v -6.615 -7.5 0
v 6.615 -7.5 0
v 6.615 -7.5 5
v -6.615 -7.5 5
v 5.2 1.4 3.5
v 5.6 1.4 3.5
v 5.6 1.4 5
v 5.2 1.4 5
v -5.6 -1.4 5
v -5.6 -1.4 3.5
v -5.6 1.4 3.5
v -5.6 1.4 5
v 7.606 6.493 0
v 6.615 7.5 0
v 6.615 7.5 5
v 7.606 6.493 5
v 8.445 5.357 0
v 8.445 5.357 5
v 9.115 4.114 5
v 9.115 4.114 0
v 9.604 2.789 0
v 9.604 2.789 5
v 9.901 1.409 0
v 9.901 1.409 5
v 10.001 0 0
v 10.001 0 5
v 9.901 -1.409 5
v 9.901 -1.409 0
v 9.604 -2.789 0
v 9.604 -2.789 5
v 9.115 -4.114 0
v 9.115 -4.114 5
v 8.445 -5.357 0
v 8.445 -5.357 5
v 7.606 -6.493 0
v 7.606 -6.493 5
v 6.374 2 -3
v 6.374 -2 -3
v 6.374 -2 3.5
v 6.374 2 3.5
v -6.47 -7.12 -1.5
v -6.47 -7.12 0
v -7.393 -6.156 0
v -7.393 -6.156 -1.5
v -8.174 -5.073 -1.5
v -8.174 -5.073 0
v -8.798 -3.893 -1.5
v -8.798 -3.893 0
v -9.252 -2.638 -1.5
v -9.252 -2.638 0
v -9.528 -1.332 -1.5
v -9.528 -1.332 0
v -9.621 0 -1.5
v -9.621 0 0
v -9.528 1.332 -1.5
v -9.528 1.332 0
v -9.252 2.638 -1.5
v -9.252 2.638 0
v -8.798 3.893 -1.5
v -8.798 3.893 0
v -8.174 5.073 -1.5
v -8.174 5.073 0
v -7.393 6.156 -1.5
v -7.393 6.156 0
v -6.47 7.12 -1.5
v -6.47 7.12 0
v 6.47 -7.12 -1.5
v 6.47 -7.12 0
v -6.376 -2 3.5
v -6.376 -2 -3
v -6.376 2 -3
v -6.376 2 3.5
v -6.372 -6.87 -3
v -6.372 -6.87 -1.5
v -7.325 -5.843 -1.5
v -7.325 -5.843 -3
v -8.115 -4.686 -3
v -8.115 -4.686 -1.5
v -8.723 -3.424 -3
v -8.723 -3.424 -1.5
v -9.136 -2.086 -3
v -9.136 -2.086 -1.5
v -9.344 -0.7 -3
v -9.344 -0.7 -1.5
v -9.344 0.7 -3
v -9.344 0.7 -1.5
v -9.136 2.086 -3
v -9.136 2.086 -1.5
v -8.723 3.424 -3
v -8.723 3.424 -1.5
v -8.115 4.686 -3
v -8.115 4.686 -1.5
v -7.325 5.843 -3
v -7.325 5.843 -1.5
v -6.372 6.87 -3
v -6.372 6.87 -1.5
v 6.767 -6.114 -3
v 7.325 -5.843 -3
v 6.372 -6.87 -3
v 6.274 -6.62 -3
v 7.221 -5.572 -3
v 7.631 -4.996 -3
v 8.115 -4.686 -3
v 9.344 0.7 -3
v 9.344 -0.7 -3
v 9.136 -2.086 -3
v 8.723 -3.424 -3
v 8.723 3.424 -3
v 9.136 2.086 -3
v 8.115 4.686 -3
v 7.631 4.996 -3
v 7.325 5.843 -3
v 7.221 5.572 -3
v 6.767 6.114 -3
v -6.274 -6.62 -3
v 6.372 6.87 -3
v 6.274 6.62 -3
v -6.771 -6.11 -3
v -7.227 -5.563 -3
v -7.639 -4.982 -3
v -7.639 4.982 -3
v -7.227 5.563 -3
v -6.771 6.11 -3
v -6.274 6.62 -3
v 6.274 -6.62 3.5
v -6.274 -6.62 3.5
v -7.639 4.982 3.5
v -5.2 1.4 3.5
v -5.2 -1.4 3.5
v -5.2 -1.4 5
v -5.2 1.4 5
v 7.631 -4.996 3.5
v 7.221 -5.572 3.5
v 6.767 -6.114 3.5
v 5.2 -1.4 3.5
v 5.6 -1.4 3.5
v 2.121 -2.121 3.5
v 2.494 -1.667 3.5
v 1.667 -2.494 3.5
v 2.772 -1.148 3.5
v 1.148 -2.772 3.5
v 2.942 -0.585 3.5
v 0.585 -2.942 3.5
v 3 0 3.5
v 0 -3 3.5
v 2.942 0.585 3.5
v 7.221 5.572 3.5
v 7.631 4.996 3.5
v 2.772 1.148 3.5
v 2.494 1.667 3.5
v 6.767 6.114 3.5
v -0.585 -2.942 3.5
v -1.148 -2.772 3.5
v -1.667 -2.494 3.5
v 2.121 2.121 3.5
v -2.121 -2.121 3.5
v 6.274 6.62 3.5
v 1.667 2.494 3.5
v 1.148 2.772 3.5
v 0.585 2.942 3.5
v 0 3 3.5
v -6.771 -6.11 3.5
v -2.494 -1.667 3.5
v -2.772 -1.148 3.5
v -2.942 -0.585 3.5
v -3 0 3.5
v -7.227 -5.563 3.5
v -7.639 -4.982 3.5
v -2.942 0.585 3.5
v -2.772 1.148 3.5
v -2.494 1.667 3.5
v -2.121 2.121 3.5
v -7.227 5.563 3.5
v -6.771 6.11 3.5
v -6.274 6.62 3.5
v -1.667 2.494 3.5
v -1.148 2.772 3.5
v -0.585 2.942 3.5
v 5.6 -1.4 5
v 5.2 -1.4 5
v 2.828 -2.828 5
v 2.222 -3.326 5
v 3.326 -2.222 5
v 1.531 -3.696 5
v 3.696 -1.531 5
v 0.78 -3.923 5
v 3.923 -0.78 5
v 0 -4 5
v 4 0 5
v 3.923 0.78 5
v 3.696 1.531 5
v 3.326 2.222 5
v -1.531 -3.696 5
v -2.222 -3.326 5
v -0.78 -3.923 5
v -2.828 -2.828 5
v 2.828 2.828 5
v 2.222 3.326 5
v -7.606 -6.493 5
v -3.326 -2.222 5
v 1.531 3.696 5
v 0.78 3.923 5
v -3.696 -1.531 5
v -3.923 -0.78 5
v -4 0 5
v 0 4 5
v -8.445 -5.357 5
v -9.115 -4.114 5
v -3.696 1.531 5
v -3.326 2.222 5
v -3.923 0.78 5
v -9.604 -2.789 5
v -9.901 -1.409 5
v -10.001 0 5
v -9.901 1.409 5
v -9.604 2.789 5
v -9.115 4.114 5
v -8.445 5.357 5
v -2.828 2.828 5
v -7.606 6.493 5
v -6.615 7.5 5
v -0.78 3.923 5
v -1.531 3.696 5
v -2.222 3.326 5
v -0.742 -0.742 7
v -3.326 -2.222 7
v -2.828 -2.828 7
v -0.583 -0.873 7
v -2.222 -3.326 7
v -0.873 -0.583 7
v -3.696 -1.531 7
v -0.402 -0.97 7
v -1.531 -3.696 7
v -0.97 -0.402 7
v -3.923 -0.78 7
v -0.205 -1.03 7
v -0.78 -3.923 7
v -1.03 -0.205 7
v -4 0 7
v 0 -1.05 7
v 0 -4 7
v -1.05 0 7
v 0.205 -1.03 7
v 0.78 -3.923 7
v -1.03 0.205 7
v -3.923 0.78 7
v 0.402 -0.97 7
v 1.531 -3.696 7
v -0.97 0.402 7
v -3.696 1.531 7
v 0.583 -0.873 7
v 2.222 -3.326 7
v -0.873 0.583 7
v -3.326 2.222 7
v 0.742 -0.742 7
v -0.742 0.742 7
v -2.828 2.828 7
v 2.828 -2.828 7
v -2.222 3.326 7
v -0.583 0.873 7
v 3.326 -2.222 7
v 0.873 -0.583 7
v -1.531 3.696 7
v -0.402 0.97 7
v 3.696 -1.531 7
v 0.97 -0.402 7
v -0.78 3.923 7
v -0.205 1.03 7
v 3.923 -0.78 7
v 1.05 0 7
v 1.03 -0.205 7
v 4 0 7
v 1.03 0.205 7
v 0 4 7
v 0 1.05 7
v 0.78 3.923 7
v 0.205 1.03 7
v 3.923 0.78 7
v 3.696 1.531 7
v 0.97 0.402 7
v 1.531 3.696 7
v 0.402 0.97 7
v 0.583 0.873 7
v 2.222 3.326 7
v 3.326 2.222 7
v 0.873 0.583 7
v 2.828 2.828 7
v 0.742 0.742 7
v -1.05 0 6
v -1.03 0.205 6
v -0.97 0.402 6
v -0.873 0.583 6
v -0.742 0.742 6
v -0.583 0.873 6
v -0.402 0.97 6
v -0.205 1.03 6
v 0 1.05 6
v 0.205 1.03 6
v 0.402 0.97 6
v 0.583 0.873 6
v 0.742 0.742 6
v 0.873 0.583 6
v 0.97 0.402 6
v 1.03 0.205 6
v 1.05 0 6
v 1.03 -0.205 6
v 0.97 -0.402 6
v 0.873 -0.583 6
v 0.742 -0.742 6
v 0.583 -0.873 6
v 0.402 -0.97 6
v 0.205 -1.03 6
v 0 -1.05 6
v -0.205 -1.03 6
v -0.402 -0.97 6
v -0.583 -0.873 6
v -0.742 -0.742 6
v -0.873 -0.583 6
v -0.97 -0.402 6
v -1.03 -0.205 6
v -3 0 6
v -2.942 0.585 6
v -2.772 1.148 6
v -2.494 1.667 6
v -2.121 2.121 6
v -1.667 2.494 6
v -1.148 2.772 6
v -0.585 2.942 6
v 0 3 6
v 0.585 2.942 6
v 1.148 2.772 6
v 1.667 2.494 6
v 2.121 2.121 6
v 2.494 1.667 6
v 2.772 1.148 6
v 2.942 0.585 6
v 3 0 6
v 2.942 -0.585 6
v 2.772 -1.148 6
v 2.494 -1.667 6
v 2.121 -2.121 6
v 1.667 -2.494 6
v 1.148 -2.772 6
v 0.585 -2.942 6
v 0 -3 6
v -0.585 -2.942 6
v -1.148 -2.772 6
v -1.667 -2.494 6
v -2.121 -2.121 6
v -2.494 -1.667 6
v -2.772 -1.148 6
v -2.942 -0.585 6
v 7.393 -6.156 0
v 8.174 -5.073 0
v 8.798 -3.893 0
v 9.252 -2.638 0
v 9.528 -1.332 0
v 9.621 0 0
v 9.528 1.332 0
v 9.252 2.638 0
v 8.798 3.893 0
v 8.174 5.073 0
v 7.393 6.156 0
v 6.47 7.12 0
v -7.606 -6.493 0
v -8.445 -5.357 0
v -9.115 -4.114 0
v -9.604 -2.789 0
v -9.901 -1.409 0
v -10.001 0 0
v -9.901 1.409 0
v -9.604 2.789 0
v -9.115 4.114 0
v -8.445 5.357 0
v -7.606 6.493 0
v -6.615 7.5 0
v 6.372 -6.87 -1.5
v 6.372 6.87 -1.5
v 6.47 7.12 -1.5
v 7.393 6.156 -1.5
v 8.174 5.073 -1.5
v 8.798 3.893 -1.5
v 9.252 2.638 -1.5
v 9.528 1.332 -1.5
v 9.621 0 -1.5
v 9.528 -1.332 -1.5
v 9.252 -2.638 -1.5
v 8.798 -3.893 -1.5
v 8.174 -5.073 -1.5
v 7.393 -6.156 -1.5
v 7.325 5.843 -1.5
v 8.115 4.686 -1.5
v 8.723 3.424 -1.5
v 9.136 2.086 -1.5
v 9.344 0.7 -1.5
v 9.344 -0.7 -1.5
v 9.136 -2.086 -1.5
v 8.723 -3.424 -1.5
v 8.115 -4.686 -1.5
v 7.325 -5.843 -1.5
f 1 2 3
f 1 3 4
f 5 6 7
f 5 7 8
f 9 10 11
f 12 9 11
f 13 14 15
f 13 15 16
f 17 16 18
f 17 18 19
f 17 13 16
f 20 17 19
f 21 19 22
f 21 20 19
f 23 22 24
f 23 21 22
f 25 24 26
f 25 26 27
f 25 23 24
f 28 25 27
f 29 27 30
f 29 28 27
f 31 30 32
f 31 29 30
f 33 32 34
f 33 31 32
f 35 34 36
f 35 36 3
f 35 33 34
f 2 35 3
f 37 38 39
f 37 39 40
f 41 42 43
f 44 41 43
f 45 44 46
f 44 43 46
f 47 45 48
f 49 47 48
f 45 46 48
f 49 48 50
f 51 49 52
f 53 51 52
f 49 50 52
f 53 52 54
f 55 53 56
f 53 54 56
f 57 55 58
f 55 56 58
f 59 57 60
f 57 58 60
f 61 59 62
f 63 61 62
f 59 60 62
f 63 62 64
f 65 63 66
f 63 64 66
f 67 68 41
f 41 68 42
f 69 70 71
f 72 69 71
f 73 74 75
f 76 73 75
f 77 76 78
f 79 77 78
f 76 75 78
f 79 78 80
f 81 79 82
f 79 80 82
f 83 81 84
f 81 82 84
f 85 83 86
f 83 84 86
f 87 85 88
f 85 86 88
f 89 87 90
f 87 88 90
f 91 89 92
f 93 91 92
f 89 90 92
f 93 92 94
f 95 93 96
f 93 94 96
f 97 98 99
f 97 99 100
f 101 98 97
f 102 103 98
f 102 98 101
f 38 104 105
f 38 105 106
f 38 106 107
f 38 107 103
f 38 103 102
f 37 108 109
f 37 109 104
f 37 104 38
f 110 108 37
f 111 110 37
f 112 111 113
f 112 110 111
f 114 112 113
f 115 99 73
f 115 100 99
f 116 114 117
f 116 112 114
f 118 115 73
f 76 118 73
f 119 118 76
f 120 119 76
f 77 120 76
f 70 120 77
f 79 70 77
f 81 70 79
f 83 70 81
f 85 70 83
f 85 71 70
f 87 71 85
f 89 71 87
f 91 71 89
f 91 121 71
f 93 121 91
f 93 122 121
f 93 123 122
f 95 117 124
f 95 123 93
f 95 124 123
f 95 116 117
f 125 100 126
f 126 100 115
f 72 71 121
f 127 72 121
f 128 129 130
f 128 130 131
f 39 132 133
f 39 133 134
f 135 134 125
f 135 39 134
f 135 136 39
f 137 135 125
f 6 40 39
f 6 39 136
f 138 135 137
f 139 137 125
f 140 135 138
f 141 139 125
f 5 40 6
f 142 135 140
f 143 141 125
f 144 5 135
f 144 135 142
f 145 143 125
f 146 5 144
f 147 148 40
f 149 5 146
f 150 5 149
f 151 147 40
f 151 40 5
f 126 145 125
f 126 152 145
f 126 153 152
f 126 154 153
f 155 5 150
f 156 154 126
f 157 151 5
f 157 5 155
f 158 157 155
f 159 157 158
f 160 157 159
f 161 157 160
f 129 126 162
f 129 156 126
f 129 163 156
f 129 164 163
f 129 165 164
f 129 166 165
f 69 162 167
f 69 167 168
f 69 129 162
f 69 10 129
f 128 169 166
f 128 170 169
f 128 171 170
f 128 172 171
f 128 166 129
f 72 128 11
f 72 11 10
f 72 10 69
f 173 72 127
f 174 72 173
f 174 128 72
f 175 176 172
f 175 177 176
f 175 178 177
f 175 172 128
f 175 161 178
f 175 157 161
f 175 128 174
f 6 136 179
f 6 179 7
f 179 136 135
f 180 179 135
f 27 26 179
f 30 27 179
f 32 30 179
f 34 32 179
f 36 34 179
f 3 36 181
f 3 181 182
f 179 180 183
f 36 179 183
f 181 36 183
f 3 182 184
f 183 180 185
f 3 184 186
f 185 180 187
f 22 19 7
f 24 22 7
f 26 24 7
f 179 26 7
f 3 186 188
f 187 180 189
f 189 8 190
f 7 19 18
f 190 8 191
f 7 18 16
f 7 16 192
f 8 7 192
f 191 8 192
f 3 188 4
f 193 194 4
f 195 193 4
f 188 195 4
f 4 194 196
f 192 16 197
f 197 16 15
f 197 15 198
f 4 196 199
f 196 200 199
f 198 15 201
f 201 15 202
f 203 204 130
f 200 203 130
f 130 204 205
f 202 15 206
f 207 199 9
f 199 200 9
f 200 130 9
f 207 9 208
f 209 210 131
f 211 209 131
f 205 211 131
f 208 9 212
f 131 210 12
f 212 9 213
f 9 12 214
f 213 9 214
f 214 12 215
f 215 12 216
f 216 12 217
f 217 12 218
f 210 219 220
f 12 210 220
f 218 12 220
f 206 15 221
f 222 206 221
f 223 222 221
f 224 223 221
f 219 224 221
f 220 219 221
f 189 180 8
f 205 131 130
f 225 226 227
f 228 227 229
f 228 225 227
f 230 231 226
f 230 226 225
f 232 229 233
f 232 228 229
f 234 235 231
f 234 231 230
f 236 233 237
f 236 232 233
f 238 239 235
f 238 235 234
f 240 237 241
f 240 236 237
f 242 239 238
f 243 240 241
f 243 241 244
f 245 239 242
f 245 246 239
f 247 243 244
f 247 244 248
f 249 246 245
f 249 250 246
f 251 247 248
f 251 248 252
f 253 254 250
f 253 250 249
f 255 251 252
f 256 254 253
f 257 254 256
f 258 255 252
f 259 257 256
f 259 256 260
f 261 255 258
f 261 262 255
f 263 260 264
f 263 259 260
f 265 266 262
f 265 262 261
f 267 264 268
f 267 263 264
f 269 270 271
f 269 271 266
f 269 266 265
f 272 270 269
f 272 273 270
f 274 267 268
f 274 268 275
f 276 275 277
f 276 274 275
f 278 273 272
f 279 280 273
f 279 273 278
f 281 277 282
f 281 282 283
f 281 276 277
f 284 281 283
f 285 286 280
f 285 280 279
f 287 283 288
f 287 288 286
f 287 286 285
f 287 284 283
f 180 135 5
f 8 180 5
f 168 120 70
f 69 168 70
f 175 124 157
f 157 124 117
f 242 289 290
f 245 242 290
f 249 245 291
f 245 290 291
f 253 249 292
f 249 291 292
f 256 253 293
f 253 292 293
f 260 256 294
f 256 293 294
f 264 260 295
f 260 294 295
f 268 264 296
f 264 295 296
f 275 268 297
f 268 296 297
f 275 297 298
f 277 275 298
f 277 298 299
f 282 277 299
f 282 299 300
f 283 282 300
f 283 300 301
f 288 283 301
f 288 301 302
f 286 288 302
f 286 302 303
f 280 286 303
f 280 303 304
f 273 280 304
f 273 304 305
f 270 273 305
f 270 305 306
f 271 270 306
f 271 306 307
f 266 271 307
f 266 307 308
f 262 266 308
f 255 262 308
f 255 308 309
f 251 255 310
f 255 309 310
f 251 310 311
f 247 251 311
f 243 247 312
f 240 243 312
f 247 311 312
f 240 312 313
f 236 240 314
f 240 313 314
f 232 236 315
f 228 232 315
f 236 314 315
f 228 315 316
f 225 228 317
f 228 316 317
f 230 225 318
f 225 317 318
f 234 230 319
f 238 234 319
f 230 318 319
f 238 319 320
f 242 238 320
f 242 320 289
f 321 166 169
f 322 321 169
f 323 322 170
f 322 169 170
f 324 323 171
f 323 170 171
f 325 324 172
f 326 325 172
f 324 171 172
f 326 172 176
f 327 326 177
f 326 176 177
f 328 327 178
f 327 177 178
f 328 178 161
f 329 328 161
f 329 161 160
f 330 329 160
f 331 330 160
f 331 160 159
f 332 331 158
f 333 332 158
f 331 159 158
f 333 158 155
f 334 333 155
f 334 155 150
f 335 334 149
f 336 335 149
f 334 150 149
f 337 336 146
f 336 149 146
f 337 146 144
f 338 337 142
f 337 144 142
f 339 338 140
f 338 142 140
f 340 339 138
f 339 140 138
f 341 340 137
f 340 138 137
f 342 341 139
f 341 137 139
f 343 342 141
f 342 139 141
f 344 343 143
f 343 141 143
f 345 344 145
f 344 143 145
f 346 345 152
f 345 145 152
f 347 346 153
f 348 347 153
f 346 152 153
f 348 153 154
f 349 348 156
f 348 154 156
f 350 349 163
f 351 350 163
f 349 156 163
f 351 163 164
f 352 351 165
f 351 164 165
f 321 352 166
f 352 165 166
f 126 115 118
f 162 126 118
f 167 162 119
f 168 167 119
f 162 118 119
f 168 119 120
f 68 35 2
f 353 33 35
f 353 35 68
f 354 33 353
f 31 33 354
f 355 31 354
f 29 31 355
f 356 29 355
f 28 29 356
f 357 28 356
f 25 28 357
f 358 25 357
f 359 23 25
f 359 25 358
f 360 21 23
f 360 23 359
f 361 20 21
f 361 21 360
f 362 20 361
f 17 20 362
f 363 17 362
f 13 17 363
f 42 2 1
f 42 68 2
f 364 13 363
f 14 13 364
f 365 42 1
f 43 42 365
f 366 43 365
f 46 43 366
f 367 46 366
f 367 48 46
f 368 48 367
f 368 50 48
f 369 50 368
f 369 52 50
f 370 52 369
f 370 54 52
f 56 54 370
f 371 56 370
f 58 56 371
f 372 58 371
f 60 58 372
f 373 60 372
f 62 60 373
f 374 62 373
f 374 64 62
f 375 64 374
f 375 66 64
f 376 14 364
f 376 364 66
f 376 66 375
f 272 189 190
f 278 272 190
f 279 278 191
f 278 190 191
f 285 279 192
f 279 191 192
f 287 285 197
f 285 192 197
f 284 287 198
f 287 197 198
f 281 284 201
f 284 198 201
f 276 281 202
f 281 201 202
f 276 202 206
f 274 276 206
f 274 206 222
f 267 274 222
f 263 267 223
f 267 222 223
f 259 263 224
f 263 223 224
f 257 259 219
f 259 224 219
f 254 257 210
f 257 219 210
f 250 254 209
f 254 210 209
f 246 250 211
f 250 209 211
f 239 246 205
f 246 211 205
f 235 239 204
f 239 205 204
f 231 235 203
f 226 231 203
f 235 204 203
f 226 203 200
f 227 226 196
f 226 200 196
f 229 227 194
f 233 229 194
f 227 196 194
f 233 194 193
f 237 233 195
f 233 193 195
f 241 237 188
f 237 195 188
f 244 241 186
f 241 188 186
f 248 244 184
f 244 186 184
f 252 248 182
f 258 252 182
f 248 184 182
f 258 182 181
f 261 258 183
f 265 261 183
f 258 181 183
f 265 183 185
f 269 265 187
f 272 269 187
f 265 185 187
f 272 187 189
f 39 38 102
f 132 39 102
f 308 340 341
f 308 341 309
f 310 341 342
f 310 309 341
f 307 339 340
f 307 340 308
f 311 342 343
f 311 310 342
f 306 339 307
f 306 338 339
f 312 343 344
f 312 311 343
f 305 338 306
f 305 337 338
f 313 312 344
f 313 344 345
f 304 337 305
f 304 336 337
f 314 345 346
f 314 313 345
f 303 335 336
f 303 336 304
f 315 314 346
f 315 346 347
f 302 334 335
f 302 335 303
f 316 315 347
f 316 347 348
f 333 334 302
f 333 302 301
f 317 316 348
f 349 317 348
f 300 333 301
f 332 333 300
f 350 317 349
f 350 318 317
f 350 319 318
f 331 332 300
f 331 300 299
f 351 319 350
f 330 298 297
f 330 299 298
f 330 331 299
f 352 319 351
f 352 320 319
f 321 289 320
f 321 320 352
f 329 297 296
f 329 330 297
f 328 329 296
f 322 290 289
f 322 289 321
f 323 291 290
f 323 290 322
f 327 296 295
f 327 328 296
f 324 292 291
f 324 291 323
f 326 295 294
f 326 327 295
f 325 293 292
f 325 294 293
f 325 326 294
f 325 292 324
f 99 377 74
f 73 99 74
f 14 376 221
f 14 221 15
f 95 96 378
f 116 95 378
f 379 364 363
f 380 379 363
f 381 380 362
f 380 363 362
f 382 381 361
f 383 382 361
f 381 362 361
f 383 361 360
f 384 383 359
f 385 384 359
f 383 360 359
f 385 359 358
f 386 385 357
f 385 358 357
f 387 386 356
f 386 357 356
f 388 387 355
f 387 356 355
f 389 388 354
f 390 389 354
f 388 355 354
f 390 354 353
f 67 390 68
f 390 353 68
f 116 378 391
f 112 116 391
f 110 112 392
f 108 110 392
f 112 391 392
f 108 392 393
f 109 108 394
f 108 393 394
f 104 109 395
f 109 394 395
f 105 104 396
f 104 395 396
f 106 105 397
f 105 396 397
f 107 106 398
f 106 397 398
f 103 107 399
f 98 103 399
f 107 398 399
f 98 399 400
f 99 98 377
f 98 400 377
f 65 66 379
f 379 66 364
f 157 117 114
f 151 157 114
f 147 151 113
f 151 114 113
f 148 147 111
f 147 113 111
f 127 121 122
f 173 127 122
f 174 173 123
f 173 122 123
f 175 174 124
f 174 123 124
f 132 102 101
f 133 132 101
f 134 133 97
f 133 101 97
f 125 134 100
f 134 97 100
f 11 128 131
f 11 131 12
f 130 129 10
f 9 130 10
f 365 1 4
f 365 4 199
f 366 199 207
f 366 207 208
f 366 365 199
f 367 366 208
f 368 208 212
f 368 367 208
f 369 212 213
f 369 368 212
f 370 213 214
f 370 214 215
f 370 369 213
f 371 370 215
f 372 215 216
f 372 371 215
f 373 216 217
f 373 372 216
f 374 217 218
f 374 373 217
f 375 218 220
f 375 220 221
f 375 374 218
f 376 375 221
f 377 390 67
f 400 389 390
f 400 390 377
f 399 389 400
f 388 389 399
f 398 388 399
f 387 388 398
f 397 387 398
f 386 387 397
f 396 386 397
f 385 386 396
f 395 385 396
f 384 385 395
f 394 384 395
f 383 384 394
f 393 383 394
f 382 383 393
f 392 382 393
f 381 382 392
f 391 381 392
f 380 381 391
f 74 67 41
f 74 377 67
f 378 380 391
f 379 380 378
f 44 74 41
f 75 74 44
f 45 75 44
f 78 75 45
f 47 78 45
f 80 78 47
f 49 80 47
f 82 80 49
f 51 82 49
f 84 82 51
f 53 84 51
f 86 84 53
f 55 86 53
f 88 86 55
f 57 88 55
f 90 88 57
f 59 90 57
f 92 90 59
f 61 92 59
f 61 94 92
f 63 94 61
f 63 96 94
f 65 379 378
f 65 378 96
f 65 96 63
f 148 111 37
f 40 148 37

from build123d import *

# Parameters (mm, degrees)
BOSS_EXTRUDE1_DEPTH = 5
SKETCH2_R           = 4
BOSS_EXTRUDE2_DEPTH = 2
BOSS_EXTRUDE3_DEPTH = 1.5
BOSS_EXTRUDE4_DEPTH = 1.5
SKETCH5_W           = 12.75
SKETCH5_H           = 4
CUT_EXTRUDE1_DEPTH  = 6.5
SKETCH6_R           = 3
CUT_EXTRUDE2_DEPTH  = 2.5
SKETCH7_R           = 1.05
CUT_EXTRUDE3_DEPTH  = 2.5
SKETCH8_W           = 0.4
SKETCH8_H           = 2.8
CUT_EXTRUDE4_DEPTH  = 2.5


with BuildPart() as part:
    # Sketch1 → Boss-Extrude1 (new body)
    with BuildSketch(Plane.XY):
        with BuildLine():
            Line((-6.615, 7.5), (6.615, 7.5))
            ThreePointArc((6.615, 7.5), (10.000621722, 0), (6.615, -7.5))
            Line((6.615, -7.5), (-6.615, -7.5))
            ThreePointArc((-6.615, -7.5), (-10.000621722, 0), (-6.615, 7.5))
        make_face()
    extrude(amount=BOSS_EXTRUDE1_DEPTH)

    # Sketch2 → Boss-Extrude2 (add)
    with BuildSketch(Plane.XY.offset(5)):
        Circle(SKETCH2_R)
    extrude(amount=BOSS_EXTRUDE2_DEPTH)

    # Sketch3 → Boss-Extrude3 (add)
    with BuildSketch(Plane(origin=(0, 0, 0), x_dir=(-1, 0, 0), z_dir=(0, 0, -1))):
        with BuildLine():
            Line((-6.469779318, -7.12), (6.469779318, -7.12))
            ThreePointArc((6.469779318, -7.12), (9.620621722, 0), (6.469779318, 7.12))
            Line((6.469779318, 7.12), (-6.469779318, 7.12))
            ThreePointArc((-6.469779318, 7.12), (-9.620621722, 0), (-6.469779318, -7.12))
        make_face()
    extrude(amount=BOSS_EXTRUDE3_DEPTH)

    # Sketch4 → Boss-Extrude4 (add)
    with BuildSketch(Plane(origin=(0, 0, -1.5), x_dir=(-1, 0, 0), z_dir=(0, 0, -1))):
        with BuildLine():
            Line((-6.372434651, -6.87), (6.372434651, -6.87))
            ThreePointArc((6.372434651, -6.87), (9.370621722, 0), (6.372434651, 6.87))
            Line((6.372434651, 6.87), (-6.372434651, 6.87))
            ThreePointArc((-6.372434651, 6.87), (-9.370621722, 0), (-6.372434651, -6.87))
        make_face()
    extrude(amount=BOSS_EXTRUDE4_DEPTH)

    # Sketch5 → Cut-Extrude1 (cut)
    with BuildSketch(Plane(origin=(0, 0, -3), x_dir=(-1, 0, 0), z_dir=(0, 0, -1))):
        with BuildLine():
            Line((-6.374378278, -2), (-7.630621722, -4.995748192))
            ThreePointArc((-7.630621722, -4.995748192), (-6.9993793, -5.847374828), (-6.273579557, -6.62))
            Line((-6.273579557, -6.62), (6.273579557, -6.62))
            ThreePointArc((6.273579557, -6.62), (7.004508128, -5.841230625), (7.639378278, -4.982348672))
            Line((7.639378278, -4.982348672), (6.375621722, -2))
            Line((6.375621722, -2), (-6.374378278, -2))
        make_face()
        with Locations((0.000621722, 0)):
            Rectangle(SKETCH5_W, SKETCH5_H)
        with BuildLine():
            Line((6.375621722, 2), (7.639378278, 4.982348672))
            ThreePointArc((7.639378278, 4.982348672), (7.004508128, 5.841230625), (6.273579557, 6.62))
            Line((6.273579557, 6.62), (-6.273579557, 6.62))
            ThreePointArc((-6.273579557, 6.62), (-6.9993793, 5.847374828), (-7.630621722, 4.995748192))
            Line((-7.630621722, 4.995748192), (-6.374378278, 2))
            Line((-6.374378278, 2), (6.375621722, 2))
        make_face()
    extrude(amount=-CUT_EXTRUDE1_DEPTH, mode=Mode.SUBTRACT)

    # Sketch6 → Cut-Extrude2 (cut)
    with BuildSketch(Plane(origin=(0, 0, 3.5), x_dir=(-1, 0, 0), z_dir=(0, 0, -1))):
        Circle(SKETCH6_R)
    extrude(amount=-CUT_EXTRUDE2_DEPTH, mode=Mode.SUBTRACT)

    # Sketch7 → Cut-Extrude3 (cut)
    with BuildSketch(Plane(origin=(0, 0, 6), x_dir=(-1, 0, 0), z_dir=(0, 0, -1))):
        Circle(SKETCH7_R)
    extrude(amount=-CUT_EXTRUDE3_DEPTH, mode=Mode.SUBTRACT)

    # Sketch8 → Cut-Extrude4 (cut)
    with BuildSketch(Plane(origin=(0, 0, 3.5), x_dir=(-1, 0, 0), z_dir=(0, 0, -1))):
        with Locations((-5.4, 0)):
            Rectangle(SKETCH8_W, SKETCH8_H)
        with Locations((5.4, 0)):
            Rectangle(SKETCH8_W, SKETCH8_H)
    extrude(amount=-CUT_EXTRUDE4_DEPTH, mode=Mode.SUBTRACT)


solid = part.part
